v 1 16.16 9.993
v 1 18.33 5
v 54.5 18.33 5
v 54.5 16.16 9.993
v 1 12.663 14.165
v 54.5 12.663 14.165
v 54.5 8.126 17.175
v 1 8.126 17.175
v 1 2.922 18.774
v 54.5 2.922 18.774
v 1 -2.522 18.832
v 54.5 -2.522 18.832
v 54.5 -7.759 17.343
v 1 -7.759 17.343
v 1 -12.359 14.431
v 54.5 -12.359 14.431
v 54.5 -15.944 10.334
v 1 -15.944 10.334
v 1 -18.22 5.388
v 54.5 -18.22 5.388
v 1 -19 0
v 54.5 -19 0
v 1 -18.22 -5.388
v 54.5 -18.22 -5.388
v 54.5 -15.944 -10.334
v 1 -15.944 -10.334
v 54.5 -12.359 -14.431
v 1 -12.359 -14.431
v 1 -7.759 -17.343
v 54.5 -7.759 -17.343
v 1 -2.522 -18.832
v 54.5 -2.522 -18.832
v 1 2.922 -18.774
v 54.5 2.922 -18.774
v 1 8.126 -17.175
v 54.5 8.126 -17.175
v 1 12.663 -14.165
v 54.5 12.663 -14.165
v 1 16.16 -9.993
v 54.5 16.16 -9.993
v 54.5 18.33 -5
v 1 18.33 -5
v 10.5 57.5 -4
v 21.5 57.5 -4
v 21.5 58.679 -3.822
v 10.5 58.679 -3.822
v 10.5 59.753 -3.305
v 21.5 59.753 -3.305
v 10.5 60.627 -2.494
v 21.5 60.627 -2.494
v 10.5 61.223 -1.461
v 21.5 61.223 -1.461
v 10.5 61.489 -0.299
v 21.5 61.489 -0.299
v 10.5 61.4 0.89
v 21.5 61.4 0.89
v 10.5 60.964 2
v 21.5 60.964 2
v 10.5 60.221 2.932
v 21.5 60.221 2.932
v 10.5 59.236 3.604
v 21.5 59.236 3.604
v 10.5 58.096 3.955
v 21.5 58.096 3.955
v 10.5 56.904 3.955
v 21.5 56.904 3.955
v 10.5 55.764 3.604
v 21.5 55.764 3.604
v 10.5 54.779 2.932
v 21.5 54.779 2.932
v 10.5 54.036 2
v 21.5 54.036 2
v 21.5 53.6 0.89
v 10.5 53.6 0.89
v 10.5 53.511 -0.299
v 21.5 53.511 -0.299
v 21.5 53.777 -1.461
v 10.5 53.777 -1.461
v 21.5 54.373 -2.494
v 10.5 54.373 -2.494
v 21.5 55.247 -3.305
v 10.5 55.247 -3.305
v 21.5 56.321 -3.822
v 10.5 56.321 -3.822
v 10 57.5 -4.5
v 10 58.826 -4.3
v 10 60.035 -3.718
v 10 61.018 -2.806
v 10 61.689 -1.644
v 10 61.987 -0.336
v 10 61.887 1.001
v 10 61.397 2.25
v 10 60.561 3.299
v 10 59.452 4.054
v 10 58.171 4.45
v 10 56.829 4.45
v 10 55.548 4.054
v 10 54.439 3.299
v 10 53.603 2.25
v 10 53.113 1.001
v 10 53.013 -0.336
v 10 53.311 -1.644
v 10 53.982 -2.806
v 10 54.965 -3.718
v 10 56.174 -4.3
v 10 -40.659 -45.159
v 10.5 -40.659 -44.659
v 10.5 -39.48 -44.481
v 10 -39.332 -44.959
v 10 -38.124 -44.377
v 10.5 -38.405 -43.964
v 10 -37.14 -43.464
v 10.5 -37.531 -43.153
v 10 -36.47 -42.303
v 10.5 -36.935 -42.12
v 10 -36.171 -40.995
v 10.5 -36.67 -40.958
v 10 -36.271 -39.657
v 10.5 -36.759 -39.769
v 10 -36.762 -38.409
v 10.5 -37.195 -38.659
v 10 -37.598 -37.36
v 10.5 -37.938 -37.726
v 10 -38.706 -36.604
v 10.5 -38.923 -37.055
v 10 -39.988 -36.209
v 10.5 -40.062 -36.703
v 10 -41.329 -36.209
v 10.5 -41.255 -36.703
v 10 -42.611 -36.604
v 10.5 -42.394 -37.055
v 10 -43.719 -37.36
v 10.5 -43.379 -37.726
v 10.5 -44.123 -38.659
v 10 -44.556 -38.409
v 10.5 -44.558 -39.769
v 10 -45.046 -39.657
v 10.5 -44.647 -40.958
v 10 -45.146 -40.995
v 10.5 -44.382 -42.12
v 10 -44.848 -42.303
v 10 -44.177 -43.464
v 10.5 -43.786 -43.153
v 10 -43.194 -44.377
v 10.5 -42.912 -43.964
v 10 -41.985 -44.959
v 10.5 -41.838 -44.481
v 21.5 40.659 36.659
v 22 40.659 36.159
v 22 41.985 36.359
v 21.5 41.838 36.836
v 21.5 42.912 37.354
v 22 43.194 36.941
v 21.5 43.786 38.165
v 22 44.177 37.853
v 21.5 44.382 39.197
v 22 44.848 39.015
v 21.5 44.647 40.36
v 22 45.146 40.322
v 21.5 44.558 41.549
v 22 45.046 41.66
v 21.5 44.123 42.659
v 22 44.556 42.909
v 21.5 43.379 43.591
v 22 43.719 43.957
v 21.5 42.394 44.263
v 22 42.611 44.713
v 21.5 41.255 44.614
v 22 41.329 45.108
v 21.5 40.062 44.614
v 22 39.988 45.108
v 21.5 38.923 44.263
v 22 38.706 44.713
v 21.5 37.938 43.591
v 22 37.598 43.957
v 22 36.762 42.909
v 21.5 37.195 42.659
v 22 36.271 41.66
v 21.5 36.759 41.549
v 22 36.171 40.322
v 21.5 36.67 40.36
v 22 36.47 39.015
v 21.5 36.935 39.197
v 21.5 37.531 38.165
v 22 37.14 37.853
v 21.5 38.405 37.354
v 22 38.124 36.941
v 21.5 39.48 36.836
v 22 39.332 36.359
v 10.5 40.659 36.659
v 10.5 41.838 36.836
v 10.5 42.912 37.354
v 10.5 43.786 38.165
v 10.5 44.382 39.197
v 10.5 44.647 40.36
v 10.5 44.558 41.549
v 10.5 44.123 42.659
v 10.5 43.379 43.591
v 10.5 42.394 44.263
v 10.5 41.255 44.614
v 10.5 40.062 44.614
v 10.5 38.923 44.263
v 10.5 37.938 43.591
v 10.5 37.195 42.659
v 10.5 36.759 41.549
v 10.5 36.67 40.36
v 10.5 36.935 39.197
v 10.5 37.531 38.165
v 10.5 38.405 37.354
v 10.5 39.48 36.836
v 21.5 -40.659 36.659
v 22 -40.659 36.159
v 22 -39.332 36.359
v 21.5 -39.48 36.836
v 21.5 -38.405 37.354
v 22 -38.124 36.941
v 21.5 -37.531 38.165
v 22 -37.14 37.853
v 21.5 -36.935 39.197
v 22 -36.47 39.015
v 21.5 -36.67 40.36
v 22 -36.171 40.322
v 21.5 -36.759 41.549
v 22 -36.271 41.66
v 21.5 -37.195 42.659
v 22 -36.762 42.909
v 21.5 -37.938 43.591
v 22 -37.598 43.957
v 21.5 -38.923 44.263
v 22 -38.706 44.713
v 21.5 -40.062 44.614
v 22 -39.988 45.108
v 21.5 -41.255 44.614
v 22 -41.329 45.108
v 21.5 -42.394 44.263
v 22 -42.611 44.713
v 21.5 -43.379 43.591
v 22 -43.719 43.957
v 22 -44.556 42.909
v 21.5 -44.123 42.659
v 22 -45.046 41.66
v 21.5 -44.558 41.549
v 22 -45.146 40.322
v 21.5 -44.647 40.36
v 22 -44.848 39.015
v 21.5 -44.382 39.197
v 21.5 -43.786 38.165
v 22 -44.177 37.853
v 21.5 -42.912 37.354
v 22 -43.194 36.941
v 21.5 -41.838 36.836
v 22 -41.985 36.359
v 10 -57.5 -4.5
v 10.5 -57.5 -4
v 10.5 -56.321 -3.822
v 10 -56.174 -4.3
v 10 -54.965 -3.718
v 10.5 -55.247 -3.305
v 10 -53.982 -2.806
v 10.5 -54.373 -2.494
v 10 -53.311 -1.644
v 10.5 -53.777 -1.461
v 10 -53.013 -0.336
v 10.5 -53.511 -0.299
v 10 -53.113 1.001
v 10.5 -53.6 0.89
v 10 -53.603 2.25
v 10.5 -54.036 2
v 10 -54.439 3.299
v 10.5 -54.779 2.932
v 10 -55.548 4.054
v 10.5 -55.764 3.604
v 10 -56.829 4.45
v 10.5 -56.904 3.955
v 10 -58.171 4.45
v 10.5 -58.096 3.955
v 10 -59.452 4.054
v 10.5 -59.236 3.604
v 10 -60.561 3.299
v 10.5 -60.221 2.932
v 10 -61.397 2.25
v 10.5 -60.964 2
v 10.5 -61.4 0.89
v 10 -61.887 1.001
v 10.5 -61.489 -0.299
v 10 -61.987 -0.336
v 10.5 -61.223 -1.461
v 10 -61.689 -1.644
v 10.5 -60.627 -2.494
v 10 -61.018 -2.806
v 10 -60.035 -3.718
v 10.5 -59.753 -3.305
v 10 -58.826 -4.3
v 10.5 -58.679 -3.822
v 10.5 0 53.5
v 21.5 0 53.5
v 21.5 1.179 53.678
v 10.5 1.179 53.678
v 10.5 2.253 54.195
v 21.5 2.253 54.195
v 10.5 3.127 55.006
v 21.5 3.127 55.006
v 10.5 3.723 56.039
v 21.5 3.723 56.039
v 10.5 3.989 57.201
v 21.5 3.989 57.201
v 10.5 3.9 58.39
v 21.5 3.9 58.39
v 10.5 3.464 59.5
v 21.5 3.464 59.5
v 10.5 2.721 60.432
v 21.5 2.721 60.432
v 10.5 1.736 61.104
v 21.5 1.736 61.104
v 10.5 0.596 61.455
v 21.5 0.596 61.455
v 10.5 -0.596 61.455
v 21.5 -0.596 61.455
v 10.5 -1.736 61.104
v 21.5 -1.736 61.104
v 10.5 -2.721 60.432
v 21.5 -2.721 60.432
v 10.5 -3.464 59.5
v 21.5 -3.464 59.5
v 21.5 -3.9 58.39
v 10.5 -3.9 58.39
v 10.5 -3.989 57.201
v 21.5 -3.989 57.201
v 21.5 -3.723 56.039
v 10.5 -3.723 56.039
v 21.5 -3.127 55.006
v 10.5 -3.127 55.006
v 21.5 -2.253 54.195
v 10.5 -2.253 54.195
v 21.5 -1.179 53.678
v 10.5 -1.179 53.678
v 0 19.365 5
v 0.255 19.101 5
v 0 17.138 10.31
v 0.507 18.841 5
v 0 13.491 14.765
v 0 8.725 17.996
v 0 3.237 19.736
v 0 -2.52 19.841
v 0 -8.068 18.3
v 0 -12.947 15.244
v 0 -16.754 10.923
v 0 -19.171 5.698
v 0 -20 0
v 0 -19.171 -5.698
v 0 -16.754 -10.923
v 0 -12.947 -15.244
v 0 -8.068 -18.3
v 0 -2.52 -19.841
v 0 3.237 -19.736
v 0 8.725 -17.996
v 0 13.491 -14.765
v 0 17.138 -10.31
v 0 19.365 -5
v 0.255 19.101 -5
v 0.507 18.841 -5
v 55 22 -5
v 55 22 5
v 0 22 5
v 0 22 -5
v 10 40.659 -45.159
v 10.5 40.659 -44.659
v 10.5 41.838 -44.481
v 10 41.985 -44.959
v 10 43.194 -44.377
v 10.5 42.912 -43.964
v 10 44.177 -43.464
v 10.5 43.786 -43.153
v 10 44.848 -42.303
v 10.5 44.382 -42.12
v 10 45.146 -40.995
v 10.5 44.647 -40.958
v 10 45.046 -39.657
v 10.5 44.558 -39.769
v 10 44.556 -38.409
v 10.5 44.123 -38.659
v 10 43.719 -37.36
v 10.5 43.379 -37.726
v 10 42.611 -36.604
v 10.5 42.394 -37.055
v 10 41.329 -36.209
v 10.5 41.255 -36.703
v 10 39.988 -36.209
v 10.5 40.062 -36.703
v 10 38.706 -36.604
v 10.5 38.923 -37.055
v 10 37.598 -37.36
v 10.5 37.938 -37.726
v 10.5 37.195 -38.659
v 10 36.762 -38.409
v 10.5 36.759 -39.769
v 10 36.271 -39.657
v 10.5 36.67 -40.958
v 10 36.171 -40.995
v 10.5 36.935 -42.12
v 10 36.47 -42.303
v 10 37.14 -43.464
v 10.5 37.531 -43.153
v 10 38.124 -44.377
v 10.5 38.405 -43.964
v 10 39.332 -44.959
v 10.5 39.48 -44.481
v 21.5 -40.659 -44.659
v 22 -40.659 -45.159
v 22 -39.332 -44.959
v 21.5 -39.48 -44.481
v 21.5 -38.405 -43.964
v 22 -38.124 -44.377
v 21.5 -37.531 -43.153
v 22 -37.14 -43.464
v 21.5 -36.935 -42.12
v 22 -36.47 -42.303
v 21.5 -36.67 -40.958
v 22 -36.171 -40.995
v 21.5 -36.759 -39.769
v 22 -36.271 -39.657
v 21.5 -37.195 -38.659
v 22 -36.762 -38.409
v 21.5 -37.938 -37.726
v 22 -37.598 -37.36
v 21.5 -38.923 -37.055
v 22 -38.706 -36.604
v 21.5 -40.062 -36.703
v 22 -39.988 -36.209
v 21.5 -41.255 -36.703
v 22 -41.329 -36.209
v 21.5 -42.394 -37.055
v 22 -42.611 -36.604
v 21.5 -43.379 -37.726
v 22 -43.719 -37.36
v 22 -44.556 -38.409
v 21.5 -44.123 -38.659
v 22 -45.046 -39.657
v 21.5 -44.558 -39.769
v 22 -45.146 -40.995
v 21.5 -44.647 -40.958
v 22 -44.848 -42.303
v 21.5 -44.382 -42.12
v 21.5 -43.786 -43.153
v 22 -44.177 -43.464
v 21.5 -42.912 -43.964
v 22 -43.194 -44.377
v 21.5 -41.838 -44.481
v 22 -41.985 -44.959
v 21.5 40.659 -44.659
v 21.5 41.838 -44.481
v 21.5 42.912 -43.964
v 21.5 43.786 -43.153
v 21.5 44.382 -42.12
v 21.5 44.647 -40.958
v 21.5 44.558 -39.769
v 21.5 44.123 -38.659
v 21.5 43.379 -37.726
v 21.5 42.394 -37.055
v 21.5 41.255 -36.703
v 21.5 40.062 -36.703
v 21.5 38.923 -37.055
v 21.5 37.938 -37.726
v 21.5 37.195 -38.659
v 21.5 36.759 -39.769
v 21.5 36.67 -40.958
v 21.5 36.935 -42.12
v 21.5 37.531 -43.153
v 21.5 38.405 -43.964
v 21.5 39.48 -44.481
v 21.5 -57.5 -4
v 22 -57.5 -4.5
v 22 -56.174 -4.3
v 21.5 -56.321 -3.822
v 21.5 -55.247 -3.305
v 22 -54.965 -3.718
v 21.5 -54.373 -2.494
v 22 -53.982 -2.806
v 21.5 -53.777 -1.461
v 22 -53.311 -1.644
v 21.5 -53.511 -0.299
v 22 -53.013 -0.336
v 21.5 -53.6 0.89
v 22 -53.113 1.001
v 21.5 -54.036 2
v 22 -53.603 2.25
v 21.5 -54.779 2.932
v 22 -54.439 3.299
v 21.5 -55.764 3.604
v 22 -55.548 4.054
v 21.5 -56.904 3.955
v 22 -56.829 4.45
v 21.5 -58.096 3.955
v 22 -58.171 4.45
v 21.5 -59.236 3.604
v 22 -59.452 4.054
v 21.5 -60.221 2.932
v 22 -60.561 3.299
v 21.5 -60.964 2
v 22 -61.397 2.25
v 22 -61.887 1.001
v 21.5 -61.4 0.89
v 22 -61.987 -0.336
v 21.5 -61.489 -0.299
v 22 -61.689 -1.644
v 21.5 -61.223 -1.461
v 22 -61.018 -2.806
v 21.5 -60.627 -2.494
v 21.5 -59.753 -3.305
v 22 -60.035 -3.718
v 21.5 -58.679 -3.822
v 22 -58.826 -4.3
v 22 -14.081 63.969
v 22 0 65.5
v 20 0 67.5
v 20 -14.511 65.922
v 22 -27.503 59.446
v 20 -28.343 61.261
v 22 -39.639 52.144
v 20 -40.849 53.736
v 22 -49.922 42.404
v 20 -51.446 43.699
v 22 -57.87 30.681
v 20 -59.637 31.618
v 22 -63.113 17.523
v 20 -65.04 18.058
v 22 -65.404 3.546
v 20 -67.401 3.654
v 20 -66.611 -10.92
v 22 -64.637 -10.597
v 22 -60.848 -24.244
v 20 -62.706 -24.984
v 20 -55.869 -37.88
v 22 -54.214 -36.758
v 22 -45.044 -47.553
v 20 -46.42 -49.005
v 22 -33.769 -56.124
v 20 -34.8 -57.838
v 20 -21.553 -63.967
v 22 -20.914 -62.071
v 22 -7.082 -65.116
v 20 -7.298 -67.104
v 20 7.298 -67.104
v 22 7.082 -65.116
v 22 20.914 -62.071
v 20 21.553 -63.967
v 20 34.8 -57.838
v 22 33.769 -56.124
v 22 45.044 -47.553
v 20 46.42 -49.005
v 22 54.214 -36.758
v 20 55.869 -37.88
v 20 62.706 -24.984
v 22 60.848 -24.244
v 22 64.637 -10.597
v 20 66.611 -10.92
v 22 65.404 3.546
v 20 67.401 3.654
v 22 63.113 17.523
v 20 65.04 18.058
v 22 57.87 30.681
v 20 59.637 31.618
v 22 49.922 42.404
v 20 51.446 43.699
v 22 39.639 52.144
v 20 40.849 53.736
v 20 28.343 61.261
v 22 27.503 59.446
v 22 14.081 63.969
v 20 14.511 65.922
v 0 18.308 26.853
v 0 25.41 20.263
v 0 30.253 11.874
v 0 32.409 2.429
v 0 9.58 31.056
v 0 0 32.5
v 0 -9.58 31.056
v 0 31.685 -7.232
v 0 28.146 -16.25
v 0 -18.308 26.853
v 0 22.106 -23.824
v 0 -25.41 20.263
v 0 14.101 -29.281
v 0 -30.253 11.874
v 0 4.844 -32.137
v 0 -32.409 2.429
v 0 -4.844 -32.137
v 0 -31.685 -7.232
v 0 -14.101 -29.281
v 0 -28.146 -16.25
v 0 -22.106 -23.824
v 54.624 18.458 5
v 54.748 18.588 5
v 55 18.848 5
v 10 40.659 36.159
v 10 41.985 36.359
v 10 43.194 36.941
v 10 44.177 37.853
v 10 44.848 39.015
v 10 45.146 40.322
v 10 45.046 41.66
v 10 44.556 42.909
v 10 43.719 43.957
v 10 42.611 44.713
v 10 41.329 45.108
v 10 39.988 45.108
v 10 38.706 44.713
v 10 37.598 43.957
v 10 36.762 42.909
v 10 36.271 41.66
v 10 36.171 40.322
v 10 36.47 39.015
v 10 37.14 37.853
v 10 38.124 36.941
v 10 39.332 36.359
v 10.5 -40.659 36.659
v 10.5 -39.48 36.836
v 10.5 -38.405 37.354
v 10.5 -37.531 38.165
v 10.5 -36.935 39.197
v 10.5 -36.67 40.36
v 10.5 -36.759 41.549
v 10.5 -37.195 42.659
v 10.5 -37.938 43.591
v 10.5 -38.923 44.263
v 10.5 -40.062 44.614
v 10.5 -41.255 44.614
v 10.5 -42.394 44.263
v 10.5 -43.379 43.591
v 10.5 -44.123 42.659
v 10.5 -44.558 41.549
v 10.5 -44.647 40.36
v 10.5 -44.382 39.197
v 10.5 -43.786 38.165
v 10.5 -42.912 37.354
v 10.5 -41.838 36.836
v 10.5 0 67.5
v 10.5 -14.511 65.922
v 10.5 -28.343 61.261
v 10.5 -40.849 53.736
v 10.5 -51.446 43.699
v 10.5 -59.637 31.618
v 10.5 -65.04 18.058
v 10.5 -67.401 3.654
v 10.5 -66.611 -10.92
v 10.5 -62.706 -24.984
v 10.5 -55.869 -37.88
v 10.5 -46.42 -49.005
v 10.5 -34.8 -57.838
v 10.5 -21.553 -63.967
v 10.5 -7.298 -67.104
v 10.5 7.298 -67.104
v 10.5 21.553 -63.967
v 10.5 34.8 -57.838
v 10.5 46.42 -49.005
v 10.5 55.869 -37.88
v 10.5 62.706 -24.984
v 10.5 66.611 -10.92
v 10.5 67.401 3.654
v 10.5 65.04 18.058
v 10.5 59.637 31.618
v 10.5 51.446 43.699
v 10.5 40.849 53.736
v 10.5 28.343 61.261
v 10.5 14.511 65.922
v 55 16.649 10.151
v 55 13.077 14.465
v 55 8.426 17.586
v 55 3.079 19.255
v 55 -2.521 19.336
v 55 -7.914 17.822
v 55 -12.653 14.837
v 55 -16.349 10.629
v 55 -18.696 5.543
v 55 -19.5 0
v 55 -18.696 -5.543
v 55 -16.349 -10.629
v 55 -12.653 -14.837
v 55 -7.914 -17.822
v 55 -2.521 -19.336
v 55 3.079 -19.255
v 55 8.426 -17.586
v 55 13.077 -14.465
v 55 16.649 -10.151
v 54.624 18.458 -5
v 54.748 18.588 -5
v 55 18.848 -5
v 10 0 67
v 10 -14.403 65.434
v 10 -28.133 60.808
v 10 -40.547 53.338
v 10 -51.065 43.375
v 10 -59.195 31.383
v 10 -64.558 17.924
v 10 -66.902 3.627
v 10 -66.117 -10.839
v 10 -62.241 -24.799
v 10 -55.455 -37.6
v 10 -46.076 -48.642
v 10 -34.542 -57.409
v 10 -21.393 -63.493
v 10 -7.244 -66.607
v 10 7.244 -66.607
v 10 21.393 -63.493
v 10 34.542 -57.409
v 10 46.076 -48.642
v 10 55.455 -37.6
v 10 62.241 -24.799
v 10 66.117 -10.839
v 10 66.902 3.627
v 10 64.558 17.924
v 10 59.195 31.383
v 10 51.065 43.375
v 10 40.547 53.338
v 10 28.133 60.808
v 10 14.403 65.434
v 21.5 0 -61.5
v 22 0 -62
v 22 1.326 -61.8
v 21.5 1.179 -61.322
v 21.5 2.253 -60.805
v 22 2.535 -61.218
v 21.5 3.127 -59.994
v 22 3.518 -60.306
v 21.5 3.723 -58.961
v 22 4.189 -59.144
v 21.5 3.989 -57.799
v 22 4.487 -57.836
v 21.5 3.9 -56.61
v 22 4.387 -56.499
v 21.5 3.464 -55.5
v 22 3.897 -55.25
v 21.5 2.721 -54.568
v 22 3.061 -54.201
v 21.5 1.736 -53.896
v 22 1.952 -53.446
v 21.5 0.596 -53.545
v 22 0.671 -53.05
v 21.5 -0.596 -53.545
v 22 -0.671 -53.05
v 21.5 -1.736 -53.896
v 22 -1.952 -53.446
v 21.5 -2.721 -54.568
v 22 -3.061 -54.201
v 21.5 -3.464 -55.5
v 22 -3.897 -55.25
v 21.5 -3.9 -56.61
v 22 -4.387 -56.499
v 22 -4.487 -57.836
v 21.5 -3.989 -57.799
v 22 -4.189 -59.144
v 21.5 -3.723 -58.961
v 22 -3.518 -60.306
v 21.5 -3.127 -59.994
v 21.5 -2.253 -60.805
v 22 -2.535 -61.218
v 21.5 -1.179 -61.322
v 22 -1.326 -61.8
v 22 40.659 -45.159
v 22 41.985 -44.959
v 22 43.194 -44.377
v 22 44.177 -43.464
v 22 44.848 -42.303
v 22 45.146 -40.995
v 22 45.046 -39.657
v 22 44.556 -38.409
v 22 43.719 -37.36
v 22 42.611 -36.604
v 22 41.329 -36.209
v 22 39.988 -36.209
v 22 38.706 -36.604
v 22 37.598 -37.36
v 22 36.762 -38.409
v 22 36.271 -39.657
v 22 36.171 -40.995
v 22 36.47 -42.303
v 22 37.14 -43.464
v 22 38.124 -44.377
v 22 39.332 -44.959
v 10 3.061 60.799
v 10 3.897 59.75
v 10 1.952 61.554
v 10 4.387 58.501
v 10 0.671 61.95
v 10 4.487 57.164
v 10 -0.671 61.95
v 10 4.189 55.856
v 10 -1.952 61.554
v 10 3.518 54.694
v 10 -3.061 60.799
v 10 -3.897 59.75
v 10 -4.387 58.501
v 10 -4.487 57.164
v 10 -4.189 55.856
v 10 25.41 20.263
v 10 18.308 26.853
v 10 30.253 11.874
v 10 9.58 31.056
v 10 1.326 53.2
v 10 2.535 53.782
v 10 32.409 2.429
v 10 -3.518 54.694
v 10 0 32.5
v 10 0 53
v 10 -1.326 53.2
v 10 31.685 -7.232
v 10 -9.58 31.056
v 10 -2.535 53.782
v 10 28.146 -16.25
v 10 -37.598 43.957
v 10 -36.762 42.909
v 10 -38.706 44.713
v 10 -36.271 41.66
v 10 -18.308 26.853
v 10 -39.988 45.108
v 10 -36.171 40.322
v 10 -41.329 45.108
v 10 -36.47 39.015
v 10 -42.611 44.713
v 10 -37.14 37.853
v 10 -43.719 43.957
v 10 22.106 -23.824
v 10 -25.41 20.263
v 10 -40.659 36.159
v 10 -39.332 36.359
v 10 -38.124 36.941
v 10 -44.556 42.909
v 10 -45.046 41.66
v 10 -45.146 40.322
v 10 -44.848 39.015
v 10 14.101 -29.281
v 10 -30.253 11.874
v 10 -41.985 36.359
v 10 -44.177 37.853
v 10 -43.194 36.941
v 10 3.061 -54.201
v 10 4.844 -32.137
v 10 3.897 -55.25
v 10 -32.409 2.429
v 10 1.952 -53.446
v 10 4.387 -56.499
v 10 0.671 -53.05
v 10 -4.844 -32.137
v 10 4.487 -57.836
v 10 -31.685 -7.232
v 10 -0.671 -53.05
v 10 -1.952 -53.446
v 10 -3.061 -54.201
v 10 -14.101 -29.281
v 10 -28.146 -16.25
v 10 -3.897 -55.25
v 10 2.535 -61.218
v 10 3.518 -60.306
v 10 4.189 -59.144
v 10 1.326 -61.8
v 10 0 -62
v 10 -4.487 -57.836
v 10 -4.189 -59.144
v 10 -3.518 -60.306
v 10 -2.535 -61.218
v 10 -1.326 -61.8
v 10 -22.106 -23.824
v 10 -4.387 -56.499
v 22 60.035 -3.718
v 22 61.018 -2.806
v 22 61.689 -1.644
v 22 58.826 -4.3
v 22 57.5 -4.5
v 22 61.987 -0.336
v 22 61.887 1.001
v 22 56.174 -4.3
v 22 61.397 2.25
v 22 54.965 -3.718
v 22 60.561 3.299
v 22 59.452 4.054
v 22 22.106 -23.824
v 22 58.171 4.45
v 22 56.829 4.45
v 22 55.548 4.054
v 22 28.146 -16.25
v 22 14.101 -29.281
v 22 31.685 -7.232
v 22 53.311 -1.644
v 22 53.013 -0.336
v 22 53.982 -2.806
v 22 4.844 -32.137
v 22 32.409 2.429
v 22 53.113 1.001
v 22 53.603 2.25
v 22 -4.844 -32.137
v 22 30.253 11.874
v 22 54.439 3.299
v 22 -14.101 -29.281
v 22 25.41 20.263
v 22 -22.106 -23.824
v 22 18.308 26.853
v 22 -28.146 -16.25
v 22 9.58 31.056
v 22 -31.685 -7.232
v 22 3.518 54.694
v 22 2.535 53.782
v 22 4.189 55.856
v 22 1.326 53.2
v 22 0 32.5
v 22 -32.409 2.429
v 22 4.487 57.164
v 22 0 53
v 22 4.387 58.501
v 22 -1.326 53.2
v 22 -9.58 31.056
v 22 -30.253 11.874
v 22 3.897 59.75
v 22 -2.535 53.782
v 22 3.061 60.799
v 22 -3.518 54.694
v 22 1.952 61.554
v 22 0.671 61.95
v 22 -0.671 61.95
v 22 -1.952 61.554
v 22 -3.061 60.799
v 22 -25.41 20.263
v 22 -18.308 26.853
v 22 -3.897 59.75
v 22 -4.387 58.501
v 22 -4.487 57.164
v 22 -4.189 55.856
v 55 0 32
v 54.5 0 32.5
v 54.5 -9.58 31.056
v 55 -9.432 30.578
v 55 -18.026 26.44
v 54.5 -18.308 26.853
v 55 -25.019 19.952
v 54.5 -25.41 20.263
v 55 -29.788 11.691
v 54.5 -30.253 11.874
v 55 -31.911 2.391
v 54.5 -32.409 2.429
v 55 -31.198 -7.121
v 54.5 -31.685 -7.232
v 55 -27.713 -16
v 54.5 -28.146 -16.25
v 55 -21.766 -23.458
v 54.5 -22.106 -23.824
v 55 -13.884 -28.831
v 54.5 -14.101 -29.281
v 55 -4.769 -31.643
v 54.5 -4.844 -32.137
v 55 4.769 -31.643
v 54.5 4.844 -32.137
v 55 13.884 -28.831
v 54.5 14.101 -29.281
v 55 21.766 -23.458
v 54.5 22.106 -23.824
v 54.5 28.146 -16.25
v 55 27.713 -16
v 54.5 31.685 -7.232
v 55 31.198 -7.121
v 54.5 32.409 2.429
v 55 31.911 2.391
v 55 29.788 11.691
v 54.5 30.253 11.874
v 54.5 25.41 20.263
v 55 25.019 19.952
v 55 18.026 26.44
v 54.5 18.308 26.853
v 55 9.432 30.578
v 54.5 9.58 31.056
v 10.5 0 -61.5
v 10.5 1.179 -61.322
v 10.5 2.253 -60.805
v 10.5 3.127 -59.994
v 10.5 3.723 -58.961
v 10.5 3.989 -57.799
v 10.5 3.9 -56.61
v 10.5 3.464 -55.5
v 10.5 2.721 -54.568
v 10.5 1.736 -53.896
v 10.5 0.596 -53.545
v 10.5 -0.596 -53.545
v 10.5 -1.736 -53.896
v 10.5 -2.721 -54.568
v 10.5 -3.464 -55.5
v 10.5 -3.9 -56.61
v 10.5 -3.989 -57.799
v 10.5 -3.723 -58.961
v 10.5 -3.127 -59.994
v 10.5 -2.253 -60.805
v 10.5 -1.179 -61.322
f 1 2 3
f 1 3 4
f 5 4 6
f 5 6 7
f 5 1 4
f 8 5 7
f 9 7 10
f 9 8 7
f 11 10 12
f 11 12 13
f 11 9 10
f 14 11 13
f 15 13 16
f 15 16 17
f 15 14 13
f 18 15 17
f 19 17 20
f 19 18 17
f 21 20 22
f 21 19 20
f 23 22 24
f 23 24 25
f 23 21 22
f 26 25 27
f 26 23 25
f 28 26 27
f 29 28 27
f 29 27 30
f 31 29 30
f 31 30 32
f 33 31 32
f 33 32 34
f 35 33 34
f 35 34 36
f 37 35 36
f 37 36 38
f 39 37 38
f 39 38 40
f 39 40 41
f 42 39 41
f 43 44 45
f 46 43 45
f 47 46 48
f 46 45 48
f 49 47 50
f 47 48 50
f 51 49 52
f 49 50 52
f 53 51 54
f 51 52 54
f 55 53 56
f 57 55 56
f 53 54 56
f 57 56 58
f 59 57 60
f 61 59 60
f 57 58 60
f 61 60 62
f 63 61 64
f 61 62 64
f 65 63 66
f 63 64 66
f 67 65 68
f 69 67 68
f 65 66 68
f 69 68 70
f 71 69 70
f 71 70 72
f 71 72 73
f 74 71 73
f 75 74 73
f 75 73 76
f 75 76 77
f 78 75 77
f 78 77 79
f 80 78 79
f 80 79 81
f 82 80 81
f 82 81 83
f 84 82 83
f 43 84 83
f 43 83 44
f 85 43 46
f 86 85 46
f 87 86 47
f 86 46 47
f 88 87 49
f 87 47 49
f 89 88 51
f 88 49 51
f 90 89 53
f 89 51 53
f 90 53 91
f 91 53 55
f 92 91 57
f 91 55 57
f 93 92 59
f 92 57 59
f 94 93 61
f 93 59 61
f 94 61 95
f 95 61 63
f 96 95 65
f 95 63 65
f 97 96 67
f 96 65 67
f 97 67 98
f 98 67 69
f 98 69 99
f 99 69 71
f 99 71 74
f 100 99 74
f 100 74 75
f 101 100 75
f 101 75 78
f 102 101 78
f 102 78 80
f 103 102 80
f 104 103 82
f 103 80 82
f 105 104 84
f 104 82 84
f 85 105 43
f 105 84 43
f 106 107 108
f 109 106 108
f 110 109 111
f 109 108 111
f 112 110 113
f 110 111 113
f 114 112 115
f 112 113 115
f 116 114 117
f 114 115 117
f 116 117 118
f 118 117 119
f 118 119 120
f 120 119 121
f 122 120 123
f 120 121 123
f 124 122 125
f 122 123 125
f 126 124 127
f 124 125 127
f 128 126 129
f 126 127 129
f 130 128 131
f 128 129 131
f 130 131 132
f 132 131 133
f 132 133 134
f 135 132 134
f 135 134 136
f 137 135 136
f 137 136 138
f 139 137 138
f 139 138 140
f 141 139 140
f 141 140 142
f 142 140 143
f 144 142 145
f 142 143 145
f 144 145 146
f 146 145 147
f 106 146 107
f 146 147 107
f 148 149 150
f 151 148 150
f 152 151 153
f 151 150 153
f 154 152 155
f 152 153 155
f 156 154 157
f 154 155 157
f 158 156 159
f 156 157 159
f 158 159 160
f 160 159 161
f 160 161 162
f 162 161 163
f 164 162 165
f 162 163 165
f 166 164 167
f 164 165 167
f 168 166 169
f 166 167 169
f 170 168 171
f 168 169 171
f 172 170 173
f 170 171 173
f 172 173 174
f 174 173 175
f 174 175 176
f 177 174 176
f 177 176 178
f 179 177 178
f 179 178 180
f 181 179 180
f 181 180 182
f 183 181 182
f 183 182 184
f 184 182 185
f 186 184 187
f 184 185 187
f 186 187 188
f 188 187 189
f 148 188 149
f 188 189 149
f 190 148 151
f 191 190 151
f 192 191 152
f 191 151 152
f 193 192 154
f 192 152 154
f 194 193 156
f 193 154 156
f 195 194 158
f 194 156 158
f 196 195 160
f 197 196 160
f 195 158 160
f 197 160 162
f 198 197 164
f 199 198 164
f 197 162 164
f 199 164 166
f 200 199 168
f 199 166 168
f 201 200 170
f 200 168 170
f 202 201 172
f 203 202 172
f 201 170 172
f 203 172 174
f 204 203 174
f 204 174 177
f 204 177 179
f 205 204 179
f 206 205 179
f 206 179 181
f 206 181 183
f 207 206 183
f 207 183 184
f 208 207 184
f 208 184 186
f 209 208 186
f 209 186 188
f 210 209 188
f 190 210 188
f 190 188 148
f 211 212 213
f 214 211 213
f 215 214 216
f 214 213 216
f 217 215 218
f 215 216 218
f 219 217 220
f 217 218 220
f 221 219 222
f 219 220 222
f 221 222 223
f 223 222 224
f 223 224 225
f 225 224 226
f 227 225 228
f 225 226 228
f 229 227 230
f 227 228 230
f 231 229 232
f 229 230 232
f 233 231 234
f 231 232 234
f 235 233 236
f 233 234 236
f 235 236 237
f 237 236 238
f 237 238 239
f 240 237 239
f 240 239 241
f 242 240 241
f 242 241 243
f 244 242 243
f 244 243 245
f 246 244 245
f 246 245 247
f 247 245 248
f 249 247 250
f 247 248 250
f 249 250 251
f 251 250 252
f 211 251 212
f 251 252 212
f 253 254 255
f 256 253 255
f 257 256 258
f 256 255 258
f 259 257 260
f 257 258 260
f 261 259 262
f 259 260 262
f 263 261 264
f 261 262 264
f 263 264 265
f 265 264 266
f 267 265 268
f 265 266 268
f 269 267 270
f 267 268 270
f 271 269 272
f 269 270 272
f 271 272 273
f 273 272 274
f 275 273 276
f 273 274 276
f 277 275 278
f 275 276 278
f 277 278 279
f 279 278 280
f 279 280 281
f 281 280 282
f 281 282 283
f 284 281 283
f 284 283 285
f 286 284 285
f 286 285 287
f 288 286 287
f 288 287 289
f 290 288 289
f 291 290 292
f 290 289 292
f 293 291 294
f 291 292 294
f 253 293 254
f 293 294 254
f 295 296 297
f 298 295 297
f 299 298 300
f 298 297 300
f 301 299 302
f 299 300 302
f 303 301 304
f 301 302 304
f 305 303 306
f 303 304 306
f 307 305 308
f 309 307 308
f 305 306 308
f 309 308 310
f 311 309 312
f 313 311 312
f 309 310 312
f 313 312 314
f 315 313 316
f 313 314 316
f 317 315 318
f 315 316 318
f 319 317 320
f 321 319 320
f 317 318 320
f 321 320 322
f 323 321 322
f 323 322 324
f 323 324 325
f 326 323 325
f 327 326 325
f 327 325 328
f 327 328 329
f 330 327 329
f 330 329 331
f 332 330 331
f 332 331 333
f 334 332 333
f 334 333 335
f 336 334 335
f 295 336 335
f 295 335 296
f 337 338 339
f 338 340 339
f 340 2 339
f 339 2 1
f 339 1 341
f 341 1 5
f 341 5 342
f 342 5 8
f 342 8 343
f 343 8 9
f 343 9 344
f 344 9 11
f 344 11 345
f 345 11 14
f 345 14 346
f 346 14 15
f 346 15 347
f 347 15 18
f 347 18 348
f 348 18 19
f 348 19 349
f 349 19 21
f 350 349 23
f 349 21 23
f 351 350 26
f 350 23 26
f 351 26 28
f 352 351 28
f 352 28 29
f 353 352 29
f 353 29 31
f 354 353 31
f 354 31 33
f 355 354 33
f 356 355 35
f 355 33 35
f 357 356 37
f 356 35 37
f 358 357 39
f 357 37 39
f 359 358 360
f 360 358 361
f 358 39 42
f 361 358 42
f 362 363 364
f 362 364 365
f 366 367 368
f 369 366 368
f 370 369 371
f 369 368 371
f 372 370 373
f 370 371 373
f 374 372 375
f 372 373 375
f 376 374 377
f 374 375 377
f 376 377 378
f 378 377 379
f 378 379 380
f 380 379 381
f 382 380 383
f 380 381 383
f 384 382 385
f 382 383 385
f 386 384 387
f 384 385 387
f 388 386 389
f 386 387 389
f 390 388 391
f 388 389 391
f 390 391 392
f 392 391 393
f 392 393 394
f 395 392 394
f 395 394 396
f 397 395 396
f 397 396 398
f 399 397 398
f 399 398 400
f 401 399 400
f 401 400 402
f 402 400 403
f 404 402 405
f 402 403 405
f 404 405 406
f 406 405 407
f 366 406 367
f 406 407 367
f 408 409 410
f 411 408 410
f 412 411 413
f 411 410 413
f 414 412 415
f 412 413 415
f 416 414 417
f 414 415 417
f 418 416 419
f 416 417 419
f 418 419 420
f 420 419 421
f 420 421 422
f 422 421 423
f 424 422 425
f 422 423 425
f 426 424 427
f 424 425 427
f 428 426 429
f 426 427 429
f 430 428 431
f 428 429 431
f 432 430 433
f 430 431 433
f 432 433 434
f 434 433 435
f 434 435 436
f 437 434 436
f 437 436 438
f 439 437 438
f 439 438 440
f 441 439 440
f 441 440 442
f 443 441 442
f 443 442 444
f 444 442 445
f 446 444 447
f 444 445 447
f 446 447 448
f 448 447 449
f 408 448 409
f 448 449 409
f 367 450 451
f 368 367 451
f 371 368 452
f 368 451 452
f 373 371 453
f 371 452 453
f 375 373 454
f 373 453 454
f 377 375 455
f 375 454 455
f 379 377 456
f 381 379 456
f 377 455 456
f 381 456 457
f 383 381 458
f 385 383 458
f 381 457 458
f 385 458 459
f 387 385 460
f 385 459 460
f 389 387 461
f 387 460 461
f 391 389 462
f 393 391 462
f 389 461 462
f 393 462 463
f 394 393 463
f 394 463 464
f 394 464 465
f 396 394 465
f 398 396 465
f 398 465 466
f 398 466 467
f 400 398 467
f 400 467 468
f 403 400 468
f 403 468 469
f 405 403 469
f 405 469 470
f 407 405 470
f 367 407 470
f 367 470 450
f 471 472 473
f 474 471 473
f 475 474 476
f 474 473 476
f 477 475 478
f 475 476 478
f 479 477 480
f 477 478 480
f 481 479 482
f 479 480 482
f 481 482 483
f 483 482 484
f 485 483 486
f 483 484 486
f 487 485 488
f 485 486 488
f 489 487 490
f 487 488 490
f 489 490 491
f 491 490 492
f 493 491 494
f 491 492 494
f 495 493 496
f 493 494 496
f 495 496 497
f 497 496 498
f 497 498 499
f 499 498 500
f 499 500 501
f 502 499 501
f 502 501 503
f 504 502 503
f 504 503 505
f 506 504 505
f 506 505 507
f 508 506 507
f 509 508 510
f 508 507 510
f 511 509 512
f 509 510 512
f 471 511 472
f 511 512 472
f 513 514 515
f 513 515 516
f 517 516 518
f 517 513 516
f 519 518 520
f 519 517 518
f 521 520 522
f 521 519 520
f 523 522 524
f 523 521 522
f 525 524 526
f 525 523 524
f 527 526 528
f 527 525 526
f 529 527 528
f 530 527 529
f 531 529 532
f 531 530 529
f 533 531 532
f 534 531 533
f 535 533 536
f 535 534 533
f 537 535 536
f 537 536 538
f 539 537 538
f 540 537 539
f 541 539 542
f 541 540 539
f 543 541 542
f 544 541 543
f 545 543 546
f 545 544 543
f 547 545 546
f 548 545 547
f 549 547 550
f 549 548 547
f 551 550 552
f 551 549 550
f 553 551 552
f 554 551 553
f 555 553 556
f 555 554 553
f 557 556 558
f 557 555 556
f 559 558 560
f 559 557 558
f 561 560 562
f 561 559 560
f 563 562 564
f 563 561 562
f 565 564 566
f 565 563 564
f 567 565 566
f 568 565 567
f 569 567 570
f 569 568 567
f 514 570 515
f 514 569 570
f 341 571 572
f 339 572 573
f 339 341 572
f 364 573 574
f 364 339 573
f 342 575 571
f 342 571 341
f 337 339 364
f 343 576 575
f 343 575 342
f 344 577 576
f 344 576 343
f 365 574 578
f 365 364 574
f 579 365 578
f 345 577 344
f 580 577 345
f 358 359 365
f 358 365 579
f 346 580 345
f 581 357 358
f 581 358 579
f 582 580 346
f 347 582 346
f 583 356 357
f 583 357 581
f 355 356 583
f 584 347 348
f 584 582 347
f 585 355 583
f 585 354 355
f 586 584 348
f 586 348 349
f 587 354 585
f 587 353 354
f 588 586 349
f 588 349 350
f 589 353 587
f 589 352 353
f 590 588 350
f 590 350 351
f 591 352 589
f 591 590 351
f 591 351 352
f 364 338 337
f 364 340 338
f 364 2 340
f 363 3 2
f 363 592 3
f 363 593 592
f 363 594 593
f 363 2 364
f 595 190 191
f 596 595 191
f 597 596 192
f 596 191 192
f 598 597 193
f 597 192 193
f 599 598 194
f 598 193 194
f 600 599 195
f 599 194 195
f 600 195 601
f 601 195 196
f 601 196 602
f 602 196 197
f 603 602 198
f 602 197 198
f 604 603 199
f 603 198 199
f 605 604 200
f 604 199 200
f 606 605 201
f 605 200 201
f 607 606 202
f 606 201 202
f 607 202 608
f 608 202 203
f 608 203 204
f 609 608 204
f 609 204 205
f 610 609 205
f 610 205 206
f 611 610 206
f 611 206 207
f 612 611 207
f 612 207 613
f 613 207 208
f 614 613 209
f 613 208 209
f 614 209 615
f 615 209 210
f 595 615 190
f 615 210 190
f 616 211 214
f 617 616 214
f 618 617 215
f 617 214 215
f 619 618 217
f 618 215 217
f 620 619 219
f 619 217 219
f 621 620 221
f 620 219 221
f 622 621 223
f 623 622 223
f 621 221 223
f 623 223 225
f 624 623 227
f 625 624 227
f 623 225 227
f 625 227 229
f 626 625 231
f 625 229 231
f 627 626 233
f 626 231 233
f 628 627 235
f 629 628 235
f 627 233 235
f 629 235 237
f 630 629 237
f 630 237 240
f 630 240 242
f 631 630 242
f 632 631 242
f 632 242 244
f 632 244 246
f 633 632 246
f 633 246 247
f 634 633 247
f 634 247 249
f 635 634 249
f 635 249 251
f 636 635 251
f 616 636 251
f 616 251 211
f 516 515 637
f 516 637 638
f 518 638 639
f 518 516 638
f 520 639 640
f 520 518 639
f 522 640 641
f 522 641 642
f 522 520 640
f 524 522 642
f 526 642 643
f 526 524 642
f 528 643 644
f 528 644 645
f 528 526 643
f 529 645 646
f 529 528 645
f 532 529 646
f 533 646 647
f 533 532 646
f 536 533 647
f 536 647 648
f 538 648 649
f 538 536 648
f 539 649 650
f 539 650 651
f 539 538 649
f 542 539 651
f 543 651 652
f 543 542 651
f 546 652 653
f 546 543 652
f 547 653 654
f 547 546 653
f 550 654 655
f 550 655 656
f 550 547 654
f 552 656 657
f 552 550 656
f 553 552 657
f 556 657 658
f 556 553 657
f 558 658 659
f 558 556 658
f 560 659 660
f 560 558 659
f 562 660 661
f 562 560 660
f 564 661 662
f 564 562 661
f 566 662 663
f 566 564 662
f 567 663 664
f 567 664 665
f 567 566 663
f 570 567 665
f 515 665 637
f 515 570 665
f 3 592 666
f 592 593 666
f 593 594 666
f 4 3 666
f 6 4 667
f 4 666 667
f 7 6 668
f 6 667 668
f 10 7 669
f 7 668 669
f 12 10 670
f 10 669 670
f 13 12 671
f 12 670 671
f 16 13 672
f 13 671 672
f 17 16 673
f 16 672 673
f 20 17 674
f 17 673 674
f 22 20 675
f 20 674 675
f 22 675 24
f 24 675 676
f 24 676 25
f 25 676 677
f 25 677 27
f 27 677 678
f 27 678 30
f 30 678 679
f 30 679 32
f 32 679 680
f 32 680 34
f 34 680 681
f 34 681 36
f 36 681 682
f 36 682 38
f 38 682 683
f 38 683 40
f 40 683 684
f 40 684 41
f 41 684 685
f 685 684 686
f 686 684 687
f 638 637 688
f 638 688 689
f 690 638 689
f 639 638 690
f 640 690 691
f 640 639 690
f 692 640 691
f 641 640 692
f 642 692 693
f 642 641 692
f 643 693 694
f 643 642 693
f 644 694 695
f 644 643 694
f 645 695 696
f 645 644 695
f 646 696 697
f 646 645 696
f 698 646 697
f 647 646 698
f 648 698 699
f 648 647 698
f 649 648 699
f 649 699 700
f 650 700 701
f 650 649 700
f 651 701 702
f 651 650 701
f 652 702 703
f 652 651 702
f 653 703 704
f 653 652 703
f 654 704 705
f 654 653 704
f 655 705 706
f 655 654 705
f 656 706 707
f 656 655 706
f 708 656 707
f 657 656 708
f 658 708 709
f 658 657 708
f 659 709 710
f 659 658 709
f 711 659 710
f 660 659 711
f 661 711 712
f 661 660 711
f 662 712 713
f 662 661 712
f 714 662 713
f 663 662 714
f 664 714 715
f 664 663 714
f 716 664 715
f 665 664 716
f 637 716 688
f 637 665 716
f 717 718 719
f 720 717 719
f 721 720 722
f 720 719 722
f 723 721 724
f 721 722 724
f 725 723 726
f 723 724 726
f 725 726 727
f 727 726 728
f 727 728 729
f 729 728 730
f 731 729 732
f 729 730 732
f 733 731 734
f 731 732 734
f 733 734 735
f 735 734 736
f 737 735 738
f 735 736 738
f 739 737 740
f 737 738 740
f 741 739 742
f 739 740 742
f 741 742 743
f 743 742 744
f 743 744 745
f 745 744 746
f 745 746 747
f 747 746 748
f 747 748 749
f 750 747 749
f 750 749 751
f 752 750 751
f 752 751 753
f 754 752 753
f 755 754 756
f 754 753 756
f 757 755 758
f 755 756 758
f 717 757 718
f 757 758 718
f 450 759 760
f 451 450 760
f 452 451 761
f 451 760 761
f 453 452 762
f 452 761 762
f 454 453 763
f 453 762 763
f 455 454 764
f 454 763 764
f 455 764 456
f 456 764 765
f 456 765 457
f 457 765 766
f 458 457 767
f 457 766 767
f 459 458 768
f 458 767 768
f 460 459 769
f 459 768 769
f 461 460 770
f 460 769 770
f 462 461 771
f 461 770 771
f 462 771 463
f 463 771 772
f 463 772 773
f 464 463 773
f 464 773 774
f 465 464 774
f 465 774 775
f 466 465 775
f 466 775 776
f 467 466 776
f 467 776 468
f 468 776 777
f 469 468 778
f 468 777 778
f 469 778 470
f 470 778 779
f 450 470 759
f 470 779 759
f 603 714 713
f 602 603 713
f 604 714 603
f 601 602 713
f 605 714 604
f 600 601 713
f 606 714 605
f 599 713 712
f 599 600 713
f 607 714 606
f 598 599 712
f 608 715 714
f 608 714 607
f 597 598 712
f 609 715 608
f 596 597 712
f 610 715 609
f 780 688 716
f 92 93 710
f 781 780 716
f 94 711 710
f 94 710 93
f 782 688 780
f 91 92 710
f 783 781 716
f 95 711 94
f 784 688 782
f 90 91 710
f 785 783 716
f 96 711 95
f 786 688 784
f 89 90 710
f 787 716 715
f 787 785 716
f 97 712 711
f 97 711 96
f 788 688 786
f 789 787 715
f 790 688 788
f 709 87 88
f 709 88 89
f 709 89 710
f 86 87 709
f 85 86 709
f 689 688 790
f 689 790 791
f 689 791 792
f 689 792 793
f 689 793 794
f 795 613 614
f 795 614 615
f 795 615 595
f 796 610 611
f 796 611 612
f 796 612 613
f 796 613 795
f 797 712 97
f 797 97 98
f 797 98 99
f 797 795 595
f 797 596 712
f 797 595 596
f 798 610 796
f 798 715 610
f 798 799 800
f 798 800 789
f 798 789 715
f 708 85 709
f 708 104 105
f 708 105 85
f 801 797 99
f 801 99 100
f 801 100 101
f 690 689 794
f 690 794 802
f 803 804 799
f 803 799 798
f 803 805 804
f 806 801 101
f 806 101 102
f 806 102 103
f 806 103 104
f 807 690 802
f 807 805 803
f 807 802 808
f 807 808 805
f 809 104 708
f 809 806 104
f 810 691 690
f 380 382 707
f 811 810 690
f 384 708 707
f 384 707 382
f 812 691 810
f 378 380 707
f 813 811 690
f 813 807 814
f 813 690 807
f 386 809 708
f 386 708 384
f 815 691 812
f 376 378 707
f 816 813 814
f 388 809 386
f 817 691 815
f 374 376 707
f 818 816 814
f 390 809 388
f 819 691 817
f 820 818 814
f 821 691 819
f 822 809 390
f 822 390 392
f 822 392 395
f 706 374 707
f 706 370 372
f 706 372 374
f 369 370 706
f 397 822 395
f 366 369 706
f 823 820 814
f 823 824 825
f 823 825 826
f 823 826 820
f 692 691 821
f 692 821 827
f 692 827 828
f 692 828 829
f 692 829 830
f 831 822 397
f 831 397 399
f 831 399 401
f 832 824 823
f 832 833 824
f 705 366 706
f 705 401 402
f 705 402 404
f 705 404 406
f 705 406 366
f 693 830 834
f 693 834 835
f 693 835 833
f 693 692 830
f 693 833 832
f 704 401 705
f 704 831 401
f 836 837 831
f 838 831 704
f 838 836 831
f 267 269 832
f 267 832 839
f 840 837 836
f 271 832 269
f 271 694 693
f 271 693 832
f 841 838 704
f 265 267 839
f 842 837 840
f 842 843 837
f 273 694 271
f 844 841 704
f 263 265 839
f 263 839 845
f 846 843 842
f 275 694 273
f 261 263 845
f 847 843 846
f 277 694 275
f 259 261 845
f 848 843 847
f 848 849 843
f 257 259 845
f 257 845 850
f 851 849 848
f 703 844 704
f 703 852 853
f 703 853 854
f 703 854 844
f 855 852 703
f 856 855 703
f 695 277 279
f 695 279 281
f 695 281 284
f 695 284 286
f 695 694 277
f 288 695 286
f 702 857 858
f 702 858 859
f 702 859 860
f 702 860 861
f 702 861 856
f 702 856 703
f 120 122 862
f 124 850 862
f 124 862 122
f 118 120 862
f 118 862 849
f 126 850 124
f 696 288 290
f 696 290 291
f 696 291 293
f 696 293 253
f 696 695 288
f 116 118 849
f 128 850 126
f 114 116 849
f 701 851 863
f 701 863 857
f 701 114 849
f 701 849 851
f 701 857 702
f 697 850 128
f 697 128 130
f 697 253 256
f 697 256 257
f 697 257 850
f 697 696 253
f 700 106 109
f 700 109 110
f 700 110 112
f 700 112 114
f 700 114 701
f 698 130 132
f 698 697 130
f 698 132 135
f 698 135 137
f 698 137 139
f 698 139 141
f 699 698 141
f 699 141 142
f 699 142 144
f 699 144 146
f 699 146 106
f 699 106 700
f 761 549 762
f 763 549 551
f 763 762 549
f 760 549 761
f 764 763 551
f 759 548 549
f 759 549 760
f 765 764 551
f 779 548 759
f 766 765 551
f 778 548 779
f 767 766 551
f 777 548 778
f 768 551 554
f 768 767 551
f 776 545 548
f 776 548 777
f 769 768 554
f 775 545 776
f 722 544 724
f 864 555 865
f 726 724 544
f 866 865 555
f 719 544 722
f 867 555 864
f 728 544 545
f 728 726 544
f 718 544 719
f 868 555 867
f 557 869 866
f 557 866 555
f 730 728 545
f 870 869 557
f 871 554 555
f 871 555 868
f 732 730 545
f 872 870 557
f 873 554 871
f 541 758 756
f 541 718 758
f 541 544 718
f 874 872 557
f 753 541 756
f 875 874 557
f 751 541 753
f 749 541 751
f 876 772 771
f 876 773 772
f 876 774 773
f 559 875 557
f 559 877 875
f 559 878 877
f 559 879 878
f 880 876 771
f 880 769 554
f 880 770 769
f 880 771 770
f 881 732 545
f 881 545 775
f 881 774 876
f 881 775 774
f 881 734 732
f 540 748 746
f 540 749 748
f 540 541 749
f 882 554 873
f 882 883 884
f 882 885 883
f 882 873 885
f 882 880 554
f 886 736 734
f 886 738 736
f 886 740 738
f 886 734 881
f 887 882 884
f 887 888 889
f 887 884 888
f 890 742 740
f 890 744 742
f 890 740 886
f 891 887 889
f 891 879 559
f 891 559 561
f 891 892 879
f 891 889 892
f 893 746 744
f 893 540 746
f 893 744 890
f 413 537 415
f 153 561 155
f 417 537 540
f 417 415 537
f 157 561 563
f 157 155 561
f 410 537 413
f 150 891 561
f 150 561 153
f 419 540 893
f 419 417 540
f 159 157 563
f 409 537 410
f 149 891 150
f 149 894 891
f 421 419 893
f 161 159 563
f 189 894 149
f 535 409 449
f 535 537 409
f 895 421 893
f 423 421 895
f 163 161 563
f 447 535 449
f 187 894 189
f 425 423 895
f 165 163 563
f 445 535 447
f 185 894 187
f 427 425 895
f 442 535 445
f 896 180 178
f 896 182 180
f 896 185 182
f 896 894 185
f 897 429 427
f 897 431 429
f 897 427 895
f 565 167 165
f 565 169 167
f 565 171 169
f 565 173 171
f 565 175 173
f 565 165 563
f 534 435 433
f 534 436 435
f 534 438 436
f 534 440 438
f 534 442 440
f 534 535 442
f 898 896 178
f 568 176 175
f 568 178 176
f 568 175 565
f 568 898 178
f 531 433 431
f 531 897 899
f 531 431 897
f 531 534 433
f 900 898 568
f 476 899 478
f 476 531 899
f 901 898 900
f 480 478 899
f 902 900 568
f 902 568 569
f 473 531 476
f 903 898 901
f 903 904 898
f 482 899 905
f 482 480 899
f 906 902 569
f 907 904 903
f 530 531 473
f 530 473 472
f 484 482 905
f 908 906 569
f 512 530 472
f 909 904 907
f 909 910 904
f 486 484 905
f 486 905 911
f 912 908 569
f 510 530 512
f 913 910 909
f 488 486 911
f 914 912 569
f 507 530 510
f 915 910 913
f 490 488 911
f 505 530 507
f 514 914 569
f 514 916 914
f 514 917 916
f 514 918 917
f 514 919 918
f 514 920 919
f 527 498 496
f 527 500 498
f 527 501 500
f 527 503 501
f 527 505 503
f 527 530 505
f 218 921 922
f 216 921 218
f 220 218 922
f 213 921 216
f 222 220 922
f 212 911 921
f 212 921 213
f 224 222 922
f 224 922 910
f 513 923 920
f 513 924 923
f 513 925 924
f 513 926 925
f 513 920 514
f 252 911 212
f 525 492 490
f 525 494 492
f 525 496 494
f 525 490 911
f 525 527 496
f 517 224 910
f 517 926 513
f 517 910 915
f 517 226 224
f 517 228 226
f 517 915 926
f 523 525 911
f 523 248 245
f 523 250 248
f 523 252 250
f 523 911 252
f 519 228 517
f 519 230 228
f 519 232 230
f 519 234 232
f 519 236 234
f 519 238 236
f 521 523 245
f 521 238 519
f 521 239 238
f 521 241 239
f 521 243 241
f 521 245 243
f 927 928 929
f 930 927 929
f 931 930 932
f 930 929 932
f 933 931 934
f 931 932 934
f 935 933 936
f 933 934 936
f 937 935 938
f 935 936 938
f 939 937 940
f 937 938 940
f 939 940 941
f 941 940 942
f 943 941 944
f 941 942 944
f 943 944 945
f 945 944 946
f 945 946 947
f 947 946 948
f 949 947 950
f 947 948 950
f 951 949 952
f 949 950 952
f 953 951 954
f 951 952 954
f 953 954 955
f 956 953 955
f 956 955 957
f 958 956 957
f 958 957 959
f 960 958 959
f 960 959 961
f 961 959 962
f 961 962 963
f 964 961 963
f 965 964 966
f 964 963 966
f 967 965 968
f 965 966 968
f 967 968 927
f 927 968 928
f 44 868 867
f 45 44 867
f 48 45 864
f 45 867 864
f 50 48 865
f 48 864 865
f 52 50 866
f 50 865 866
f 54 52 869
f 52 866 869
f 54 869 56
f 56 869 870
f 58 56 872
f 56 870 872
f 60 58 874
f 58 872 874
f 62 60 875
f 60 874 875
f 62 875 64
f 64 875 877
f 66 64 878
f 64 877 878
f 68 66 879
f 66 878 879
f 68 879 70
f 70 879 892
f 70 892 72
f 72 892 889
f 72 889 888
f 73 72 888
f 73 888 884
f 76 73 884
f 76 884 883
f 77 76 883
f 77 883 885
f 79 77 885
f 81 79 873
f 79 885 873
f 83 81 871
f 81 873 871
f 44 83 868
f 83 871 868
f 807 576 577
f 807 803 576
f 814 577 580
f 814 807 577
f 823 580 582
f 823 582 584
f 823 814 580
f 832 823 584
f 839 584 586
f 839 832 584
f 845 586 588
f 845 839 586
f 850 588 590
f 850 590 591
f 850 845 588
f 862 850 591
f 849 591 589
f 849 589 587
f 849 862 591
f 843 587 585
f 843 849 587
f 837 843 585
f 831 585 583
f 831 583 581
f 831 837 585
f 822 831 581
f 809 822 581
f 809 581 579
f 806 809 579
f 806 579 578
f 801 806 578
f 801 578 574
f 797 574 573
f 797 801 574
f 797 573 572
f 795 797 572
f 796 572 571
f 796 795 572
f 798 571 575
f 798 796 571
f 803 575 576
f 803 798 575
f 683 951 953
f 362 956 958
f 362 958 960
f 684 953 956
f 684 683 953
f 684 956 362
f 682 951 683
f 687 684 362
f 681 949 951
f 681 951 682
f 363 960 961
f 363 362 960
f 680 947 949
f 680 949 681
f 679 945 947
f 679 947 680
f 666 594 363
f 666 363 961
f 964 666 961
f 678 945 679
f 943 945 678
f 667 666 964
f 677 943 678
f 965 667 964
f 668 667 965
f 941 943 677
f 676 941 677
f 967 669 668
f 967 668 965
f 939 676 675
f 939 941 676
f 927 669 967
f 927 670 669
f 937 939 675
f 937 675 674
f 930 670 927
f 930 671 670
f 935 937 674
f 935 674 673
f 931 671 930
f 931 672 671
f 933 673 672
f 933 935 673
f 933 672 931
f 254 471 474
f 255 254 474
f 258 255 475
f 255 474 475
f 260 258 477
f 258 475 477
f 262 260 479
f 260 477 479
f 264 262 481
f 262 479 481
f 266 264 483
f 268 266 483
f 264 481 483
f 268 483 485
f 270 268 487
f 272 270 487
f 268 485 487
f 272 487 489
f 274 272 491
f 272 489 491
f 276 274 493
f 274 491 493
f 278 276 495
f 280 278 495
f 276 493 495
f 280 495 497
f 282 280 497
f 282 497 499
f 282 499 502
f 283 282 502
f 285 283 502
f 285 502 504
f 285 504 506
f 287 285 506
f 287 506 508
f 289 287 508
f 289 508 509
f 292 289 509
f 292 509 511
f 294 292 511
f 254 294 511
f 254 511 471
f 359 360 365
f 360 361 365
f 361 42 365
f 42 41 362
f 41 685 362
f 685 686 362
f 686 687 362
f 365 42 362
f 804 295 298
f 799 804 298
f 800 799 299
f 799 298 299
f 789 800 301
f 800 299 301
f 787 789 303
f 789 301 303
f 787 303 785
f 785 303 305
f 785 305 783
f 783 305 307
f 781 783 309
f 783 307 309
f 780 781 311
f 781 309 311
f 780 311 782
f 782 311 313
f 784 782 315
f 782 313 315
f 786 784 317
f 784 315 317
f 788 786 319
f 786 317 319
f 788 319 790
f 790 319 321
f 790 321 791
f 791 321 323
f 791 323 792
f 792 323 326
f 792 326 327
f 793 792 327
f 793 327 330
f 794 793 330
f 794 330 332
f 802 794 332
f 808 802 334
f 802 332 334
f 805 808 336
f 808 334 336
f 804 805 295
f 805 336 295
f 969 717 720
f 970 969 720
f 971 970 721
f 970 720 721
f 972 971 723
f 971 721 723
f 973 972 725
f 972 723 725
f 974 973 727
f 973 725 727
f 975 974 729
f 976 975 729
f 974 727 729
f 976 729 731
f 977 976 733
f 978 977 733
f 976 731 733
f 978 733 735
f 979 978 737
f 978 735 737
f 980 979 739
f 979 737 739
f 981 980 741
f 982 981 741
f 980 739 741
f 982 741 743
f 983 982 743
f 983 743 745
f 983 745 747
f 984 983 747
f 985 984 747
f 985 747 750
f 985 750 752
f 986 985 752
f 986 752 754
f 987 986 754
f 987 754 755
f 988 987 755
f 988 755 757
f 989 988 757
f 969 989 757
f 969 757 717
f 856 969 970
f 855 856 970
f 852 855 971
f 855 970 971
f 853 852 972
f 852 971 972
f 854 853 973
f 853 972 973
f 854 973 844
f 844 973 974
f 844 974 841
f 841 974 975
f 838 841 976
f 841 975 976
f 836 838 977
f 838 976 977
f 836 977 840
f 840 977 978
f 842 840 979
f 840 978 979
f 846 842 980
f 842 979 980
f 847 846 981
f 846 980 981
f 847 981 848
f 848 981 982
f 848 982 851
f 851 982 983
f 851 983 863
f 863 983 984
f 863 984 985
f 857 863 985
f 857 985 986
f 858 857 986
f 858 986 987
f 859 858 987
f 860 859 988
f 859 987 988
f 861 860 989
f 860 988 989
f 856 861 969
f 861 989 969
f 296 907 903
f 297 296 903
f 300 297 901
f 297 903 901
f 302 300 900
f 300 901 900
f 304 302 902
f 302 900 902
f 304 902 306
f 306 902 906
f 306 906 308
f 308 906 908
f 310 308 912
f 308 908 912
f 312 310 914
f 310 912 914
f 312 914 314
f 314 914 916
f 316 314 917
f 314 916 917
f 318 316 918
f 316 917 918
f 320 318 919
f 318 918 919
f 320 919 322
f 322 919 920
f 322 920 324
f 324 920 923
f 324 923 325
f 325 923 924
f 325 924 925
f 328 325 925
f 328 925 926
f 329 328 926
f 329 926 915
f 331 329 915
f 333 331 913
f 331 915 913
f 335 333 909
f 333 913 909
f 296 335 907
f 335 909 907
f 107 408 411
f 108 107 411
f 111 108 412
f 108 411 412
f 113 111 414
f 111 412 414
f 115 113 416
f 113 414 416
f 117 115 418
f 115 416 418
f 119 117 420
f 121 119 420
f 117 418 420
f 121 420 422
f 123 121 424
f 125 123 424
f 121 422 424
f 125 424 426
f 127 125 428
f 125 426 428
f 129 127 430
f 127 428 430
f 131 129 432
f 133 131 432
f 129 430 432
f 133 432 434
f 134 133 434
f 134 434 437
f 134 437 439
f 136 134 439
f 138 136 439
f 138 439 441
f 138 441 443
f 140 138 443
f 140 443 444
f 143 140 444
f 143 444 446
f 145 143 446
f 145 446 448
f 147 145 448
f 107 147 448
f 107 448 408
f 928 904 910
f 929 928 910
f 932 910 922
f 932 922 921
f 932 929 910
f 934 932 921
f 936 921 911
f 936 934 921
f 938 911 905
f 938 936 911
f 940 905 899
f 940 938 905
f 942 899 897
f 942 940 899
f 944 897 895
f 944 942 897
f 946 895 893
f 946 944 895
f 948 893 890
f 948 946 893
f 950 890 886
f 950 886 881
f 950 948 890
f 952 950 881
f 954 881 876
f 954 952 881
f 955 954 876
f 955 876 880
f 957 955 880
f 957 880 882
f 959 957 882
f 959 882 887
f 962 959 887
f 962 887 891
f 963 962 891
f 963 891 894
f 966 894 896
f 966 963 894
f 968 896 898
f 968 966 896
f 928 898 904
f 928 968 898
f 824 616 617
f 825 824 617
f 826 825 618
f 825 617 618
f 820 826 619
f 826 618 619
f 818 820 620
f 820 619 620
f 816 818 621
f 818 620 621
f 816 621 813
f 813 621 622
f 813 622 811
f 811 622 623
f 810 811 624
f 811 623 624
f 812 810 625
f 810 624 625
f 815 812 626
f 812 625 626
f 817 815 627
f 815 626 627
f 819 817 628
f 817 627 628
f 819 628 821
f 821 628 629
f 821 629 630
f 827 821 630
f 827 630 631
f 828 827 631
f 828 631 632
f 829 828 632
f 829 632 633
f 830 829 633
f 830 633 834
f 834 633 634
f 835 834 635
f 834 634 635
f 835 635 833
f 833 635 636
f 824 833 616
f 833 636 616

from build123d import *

# Parameters (mm, degrees)
SKETCH_2_W          = 10
SKETCH_2_H          = 22
CUT_EXTRUDE_1_DEPTH = 111.170322683
SKETCH_3_R          = 4
CUT_EXTRUDE_2_DEPTH = 102.002475217
CHAMFER_1_SIZE      = 2
CHAMFER_2_SIZE      = 1
CHAMFER_3_SIZE      = 0.5


with BuildPart() as part:
    # 草图1 → 旋转1 (revolve)
    with BuildSketch(Plane.XY, mode=Mode.PRIVATE) as revolve_1_sk:
        Polygon((0, 19), (0, 32.5), (10, 32.5), (10, 67.5), (22, 67.5), (22, 32.5), (55, 32.5), (55, 19), align=None)
    revolve(revolve_1_sk.sketch.rotate(Axis((0, 0, 0), (1, 0, 0)), 90), axis=Axis((0, 0, 0), (1, 0, 0)))

    # 草图2 → 切除-拉伸1 (cut, through all)
    with BuildSketch(Plane(origin=(55, 0, 0), x_dir=(0, 0, -1), z_dir=(1, 0, 0))):
        with Locations((0, 11)):
            Rectangle(SKETCH_2_W, SKETCH_2_H)
    extrude(amount=-CUT_EXTRUDE_1_DEPTH, mode=Mode.SUBTRACT)

    # 草图3 → 切除-拉伸2 (cut, through all)
    with BuildSketch(Plane(origin=(22, 0, 0), x_dir=(0, 0, -1), z_dir=(1, 0, 0))):
        with Locations((0, 57.5)):
            Circle(SKETCH_3_R)
        with Locations((40.658639918, 40.658639918)):
            Circle(SKETCH_3_R)
        with Locations((57.5, 0)):
            Circle(SKETCH_3_R)
        with Locations((40.658639918, -40.658639918)):
            Circle(SKETCH_3_R)
        with Locations((0, -57.5)):
            Circle(SKETCH_3_R)
        with Locations((-40.658639918, -40.658639918)):
            Circle(SKETCH_3_R)
        with Locations((-57.5, 0)):
            Circle(SKETCH_3_R)
        with Locations((-40.658639918, 40.658639918)):
            Circle(SKETCH_3_R)
    extrude(amount=-CUT_EXTRUDE_2_DEPTH, mode=Mode.SUBTRACT)

    # 倒角1
    chamfer_1_edges = [part.edges().sort_by_distance(p)[0] for p in [
        (22, 0, -67.5),
    ]]
    chamfer(chamfer_1_edges, length=CHAMFER_1_SIZE)

    # 倒角2
    chamfer_2_edges = [part.edges().sort_by_distance(p)[0] for p in [
        (0, -19, 0),
    ]]
    chamfer(chamfer_2_edges, length=CHAMFER_2_SIZE)

    # 倒角3
    chamfer_3_edges = [part.edges().sort_by_distance(p)[0] for p in [
        (55, -19, 0),
        (10, 57.5, 4),
        (22, 57.5, 4),
        (10, 40.658639918, -36.658639918),
        (22, 40.658639918, -36.658639918),
        (10, 0, -53.5),
        (22, 0, -53.5),
        (10, -40.658639918, -36.658639918),
        (22, -40.658639918, -36.658639918),
        (10, -57.5, 4),
        (22, -57.5, 4),
        (10, -40.658639918, 44.658639918),
        (22, -40.658639918, 44.658639918),
        (10, 0, 61.5),
        (22, 0, 61.5),
        (10, 40.658639918, 44.658639918),
        (22, 40.658639918, 44.658639918),
        (55, 0, -32.5),
        (10, 0, -67.5),
    ]]
    chamfer(chamfer_3_edges, length=CHAMFER_3_SIZE)


solid = part.part
